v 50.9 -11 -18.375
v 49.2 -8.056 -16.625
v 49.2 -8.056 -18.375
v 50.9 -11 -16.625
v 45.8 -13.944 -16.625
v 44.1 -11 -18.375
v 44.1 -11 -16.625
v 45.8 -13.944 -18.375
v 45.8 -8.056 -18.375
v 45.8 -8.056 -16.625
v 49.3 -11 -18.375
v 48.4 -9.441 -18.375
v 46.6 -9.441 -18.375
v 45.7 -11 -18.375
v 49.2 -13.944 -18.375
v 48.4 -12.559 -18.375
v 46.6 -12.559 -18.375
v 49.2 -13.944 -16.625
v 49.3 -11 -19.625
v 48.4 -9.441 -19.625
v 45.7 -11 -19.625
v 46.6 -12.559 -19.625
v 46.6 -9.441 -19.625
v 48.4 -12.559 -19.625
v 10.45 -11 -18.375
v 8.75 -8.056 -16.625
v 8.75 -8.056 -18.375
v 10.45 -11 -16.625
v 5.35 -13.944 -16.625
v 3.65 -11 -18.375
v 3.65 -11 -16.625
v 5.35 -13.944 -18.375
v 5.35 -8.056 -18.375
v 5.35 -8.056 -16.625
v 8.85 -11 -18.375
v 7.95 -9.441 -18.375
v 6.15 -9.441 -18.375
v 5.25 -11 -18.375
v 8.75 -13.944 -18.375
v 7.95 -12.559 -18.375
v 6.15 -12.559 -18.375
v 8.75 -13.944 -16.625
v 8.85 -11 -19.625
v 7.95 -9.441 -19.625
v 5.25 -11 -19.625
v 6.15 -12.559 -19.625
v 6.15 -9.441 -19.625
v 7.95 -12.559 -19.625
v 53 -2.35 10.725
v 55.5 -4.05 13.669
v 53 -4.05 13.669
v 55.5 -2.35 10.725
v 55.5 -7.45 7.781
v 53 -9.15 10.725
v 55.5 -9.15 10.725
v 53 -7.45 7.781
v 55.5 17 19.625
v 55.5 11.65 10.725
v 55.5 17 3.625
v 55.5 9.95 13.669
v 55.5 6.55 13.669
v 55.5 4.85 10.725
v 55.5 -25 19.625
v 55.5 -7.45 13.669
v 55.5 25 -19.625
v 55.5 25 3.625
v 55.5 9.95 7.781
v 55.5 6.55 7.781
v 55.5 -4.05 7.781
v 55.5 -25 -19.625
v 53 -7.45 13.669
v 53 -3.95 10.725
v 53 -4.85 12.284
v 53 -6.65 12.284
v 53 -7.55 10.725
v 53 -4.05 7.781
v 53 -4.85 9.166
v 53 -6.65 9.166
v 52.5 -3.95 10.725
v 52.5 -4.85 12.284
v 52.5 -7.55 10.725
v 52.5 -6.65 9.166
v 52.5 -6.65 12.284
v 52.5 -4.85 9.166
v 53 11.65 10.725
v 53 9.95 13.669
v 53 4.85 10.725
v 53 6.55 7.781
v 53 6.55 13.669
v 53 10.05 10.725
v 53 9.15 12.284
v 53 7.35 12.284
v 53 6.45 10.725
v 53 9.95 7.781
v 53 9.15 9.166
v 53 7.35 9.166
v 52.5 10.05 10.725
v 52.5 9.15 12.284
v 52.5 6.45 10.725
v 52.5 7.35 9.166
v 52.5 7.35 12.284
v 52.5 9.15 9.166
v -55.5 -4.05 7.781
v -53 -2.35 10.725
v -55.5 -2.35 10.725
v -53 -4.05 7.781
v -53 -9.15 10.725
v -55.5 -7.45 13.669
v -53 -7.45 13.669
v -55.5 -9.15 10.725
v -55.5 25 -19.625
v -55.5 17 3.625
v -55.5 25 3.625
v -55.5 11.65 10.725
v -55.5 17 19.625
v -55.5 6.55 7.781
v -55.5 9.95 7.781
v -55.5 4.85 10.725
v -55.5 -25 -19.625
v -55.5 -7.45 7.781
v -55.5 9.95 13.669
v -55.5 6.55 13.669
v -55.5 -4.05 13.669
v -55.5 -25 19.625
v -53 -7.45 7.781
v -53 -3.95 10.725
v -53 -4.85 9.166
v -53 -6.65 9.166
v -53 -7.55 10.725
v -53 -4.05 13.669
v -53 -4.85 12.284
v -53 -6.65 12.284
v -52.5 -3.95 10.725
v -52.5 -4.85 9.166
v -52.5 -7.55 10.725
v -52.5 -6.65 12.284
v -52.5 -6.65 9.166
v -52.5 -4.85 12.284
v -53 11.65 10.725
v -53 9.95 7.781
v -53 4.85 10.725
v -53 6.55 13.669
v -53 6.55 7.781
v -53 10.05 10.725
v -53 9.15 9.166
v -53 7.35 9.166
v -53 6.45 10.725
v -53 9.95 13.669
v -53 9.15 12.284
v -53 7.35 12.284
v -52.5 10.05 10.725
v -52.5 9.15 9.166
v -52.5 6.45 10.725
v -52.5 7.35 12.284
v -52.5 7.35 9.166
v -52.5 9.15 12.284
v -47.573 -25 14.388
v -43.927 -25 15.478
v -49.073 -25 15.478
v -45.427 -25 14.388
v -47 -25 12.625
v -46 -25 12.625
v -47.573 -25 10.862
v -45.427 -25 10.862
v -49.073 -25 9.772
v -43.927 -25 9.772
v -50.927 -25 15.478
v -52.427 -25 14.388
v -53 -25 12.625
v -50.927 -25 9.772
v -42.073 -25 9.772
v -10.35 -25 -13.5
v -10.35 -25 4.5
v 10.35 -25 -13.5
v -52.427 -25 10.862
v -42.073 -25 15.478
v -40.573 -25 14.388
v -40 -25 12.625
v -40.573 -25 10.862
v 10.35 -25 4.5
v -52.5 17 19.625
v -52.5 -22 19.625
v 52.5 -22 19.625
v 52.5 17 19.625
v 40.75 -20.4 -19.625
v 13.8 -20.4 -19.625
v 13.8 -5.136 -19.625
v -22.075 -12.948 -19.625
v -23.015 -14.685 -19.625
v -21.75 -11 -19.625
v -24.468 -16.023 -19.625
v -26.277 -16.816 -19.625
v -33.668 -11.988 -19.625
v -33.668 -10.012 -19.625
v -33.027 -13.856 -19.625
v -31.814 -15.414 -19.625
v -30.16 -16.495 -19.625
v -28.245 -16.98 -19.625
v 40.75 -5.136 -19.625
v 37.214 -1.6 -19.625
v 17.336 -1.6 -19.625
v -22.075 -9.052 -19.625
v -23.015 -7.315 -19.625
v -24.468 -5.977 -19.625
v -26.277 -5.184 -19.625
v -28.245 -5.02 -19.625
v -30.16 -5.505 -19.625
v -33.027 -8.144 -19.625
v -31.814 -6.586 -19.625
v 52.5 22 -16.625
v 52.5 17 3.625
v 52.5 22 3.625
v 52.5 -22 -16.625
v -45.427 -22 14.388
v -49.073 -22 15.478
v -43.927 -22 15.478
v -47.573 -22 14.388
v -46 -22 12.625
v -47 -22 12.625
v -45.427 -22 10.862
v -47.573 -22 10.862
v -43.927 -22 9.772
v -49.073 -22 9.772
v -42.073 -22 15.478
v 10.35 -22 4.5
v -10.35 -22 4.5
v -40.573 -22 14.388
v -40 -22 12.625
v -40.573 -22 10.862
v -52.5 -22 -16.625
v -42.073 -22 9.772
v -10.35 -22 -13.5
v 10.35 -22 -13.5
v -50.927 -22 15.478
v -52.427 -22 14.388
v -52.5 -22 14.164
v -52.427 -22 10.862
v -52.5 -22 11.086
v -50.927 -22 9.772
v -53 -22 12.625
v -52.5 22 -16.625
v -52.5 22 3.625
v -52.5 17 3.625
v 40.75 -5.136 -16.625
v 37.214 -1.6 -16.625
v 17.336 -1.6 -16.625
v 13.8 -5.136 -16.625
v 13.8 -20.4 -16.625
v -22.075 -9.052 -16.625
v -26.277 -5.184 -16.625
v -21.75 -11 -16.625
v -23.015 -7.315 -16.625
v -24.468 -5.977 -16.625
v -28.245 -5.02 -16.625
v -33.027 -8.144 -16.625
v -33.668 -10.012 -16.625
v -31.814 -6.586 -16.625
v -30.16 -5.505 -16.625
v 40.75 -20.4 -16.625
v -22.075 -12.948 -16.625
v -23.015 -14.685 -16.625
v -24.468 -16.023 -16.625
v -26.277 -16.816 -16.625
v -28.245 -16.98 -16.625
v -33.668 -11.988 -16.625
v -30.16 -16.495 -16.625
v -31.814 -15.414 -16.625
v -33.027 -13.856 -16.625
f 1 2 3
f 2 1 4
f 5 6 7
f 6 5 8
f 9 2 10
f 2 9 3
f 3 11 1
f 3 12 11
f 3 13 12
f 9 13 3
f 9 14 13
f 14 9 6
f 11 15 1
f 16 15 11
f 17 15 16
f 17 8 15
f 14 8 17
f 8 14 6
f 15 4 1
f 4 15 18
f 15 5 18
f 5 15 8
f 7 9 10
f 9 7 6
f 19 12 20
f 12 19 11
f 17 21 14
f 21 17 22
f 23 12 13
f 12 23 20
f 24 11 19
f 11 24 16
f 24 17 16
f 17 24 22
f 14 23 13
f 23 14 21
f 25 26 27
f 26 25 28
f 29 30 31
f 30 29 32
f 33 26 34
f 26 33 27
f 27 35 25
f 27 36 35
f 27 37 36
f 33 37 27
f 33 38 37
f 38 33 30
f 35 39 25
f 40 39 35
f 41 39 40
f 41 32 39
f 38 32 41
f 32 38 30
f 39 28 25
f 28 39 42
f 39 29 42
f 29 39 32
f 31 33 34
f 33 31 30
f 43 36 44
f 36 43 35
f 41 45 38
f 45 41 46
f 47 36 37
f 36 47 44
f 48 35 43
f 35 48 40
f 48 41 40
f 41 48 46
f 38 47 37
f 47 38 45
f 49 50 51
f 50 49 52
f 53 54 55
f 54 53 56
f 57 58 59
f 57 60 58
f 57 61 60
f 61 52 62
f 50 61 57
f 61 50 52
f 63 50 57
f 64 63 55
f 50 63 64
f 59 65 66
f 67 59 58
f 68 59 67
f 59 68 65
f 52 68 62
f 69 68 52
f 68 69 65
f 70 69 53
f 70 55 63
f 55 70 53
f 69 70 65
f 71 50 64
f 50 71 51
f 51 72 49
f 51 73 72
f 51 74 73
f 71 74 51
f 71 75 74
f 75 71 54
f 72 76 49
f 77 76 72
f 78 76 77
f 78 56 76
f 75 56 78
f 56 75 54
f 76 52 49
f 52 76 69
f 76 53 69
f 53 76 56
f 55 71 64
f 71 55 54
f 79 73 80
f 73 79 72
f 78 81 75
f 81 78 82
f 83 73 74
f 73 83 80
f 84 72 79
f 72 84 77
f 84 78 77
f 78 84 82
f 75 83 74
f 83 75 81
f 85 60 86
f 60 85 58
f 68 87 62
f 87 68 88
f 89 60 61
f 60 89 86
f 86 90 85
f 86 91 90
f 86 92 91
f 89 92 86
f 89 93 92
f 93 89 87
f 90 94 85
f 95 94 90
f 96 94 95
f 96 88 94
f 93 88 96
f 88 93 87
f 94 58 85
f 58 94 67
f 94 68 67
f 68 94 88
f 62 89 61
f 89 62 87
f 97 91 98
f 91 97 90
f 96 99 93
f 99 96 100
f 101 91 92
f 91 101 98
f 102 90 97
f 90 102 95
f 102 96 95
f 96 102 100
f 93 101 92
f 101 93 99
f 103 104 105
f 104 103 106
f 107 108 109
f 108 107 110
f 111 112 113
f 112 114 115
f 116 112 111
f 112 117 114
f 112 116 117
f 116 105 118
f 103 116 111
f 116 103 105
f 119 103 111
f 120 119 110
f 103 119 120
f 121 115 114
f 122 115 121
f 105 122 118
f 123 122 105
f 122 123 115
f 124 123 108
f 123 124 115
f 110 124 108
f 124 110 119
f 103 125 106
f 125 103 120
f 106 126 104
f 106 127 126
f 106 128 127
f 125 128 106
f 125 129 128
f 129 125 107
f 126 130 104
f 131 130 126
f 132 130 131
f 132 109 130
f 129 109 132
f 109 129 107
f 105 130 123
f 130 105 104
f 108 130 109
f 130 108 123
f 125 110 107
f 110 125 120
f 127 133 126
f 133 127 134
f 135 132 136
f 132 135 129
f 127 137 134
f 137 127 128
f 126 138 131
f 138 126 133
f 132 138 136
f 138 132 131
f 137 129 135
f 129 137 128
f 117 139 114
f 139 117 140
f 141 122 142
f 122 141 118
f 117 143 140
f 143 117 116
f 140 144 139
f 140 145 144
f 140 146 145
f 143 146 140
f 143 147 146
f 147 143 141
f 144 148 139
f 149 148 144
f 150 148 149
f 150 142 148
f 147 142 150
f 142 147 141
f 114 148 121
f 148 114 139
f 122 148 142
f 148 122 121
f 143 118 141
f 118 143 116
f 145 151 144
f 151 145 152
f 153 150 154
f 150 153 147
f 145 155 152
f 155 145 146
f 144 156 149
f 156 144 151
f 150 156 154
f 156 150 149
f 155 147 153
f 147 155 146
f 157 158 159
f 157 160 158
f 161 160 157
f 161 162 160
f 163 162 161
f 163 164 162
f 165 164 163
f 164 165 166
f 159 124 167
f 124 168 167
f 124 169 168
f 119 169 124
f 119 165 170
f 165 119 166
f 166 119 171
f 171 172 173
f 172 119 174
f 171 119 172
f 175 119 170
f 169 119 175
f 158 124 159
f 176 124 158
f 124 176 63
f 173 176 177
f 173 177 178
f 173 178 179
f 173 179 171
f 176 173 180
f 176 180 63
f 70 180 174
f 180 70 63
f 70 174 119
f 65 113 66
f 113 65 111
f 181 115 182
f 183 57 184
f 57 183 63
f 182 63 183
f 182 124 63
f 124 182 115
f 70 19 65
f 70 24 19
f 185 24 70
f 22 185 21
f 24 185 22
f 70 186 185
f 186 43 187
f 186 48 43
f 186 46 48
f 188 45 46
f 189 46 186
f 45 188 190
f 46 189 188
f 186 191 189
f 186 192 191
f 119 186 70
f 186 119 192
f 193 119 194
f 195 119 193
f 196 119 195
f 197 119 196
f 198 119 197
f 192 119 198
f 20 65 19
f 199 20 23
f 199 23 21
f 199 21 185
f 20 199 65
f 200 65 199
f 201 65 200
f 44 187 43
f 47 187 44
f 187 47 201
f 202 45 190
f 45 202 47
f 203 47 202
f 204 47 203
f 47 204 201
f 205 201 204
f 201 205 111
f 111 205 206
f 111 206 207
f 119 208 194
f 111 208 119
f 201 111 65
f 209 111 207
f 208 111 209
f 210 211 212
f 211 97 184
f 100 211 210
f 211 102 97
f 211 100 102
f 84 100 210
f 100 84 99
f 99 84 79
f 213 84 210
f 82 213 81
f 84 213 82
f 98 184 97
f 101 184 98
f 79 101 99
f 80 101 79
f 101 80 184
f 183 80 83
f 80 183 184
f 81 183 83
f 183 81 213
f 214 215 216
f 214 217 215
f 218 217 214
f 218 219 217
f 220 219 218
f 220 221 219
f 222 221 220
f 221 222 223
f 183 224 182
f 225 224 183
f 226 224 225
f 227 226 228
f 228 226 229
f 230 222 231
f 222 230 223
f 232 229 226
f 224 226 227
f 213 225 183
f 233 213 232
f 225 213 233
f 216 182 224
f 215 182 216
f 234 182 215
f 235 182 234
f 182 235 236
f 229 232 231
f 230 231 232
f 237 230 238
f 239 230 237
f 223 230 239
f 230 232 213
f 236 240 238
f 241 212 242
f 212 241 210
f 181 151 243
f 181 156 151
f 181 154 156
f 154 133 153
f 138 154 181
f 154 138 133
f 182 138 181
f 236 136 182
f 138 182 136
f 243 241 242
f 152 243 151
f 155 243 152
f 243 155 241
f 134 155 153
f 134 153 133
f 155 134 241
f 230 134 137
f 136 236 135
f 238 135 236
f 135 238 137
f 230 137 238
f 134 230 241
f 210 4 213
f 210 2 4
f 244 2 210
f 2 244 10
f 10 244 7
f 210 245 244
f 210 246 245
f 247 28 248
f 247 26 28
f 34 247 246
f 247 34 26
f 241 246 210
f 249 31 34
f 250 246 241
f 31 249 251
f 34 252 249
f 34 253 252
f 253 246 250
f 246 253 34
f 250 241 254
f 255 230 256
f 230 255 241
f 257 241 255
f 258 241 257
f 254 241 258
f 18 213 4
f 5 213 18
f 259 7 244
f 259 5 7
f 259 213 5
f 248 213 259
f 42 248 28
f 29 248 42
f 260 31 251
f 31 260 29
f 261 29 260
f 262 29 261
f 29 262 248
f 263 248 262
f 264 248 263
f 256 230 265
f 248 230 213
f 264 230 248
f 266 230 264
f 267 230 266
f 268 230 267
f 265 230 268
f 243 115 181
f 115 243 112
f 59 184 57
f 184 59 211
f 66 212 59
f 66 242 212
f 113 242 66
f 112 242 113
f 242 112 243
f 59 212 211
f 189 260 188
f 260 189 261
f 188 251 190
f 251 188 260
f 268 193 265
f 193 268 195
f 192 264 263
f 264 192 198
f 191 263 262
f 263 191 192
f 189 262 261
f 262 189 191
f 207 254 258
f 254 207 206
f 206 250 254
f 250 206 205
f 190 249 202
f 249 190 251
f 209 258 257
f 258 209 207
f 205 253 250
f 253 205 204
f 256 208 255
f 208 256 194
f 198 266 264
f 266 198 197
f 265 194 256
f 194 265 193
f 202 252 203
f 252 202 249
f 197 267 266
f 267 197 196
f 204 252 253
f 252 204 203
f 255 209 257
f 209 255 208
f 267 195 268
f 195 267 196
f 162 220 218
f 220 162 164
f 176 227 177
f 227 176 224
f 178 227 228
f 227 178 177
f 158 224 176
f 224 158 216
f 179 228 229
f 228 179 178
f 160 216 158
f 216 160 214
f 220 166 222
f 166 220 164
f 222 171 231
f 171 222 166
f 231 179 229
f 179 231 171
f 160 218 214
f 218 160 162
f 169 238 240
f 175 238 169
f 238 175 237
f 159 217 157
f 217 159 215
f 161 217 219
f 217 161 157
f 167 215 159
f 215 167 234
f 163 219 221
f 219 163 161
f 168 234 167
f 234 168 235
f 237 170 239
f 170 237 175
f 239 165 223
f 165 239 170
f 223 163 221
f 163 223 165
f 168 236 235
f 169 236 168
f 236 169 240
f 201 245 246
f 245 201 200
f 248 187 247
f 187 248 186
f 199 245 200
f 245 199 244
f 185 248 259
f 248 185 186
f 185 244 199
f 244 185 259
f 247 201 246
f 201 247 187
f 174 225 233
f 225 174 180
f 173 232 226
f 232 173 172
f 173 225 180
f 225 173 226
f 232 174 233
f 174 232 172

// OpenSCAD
show_assembly = false; // Set to false to only show the part

power_supply_depth = 215;
power_supply_width = 114;
power_supply_height = 50;
power_supply_wall_thickness = 1.5;
power_supply_cutout_depth = 16; // cutout for terminals
power_supply_cutout_height = 42; // from top
power_supply_slot_depth_offset = 5.4; // from front
power_supply_slot_bottom_offset = 11.25;
power_supply_slot_dia = 2.88; // to be verified
power_supply_slot_height = 25;
power_supply_width_pot_offset = power_supply_width/2 - 14;
power_supply_width_led_offset = power_supply_width/2 - 7;
power_supply_depth_pot_offset = 7; // From cutout edge, also used for the led
power_supply_screw_bank_width = 87.5;
power_supply_screw_bank_height = 20;
power_supply_screw_bank_right_offset = 5;

connector_front_height = 22;
connector_front_width = 30.45;
connector_front_depth = 4.75;
connector_contact_depth = 10;
connector_depth = 28; // including everything
connector_body_depth = connector_depth - connector_front_depth - connector_contact_depth;
connector_body_height = 18.8;
connector_body_width = 26.95;
connector_has_wings = true;
connector_wing_width = 10;
connector_wing_depth = 3.85;
connector_screw_center = 5; // inside wing
connector_contact_width_sep = 15;
connector_contact_height_sep = 7.5;
connector_contact_width = 2.2;
connector_contact_height = 3.9;

switch_depth = 28.0; // including contacts
switch_front_height = 21.25;
switch_front_width = 27.0;
switch_front_depth = 3; // to be verified
switch_contact_depth = 7;
switch_contact_height = 5;
switch_contact_width = 2;
switch_contact_distance = 7;
switch_body_height = 12.1;
switch_body_width = 20.7;
switch_body_depth = switch_depth - switch_front_depth - switch_contact_depth;

m3_nut_height=2.5;
m3_nut_radius=3.4;
m3_nut_dia=m3_nut_radius*2;
m3_bolt_radius=1.8;
m3_bolt_dia=m3_bolt_radius*2;

module nut_trap(wall_thickness) {
	union() {
		rotate([0, 90, 0])
			cylinder(r=m3_nut_radius, h=m3_nut_height, $fn=6, center=true);
		translate([wall_thickness - m3_nut_height, 0, 0])
			rotate([0, 90, 0])
				cylinder(r=m3_bolt_radius, h=wall_thickness, center=true);
	}
}

module power_supply_slot() {
	hull() {
		translate([0,0,power_supply_slot_height/2 - power_supply_slot_dia/2])
			rotate([0,90,0])
				cylinder(h=power_supply_wall_thickness, d=power_supply_slot_dia, center=true, $fn=16);
		translate([0,0,-power_supply_slot_height/2 + power_supply_slot_dia/2])
			rotate([0,90,0])
				cylinder(h=power_supply_wall_thickness, d=power_supply_slot_dia, center=true, $fn=16);
	}
}

module power_supply() {
	union() {
		difference() {
			cube([	power_supply_width,
					power_supply_depth,
					power_supply_height], true);
			translate([0, 
						-power_supply_depth/2 + power_supply_cutout_depth/2, 
						power_supply_height/2 - power_supply_cutout_height/2])
				cube([	power_supply_width - power_supply_wall_thickness*2,
						power_supply_cutout_depth, 
						power_supply_cutout_height],
						true);
			translate([	power_supply_width/2 - power_supply_wall_thickness/2,
							-power_supply_depth/2 + power_supply_wall_thickness + power_supply_slot_depth_offset,
							-power_supply_height/2 + power_supply_slot_height/2 + power_supply_slot_bottom_offset])
				power_supply_slot();
			translate([	-power_supply_width/2 + power_supply_wall_thickness/2,
							-power_supply_depth/2 + power_supply_wall_thickness + power_supply_slot_depth_offset,
							-power_supply_height/2 + power_supply_slot_height/2 + power_supply_slot_bottom_offset])
				power_supply_slot();
		}
		translate([	power_supply_width/2 - power_supply_wall_thickness -
							power_supply_screw_bank_right_offset - power_supply_screw_bank_width/2,
						-power_supply_depth/2 + power_supply_cutout_depth/2,
						-power_supply_height/2 + power_supply_screw_bank_height/2 +
							power_supply_height - power_supply_cutout_height])
			cube([	power_supply_screw_bank_width,
					power_supply_cutout_depth,
					power_supply_screw_bank_height],
					true);
	}
}

module power_connector_shape(height, width, depth, cornerWidth) {
	rotationOffset = sqrt(cornerWidth*cornerWidth+cornerWidth*cornerWidth)/2 - cornerWidth/2;
	widthOffset = width/2 - cornerWidth/2;
	heightOffset = height/2 - cornerWidth/2;
	hull() {
		translate([-widthOffset, 0, heightOffset]) cube([cornerWidth,depth,cornerWidth], true);
		translate([widthOffset, 0, heightOffset]) cube([cornerWidth,depth,cornerWidth], true);
		translate([-widthOffset + rotationOffset, 0, -heightOffset + rotationOffset]) rotate([0,45,0])
			cube([cornerWidth,depth,cornerWidth], true);
		translate([widthOffset - rotationOffset, 0, -heightOffset + rotationOffset]) rotate([0,45,0])
			cube([cornerWidth,depth,cornerWidth], true);
	}
}

module power_connector_wing() {
	difference() {
		hull() {
			translate([-connector_wing_width/2,0,-connector_wing_depth/2])
				linear_extrude(height=connector_wing_depth) 
					polygon(points=[	[0,-connector_front_height/2],
											[0, connector_front_height/2],
											[connector_wing_width, 0]]);
			translate([connector_wing_width/2 - m3_bolt_dia*1.5/2,0,0])
				cylinder(h = connector_wing_depth, d = m3_bolt_dia*1.5, center = true);
		}
	translate([-connector_wing_width/2 + connector_screw_center, 0, 0])
		cylinder(h = connector_wing_depth, d = m3_bolt_dia, center = true);
	}
}

module power_connector_contact() {
	cube([connector_contact_width,connector_depth, connector_contact_height], true);
}

module power_connector() {
	union() {
		difference() {
			union() {
				cube([	connector_front_width, 
						connector_front_depth, 
						connector_front_height], true);
				translate([0, connector_front_depth / 2 + connector_body_depth / 2])
					power_connector_shape(	height = connector_body_height,
													width = connector_body_width,
													depth = connector_body_depth,
													cornerWidth = 5);
				if (connector_has_wings) {
					translate([	connector_wing_width/2 + connector_front_width/2,
									connector_front_depth/2 - connector_wing_depth/2,
									0]) 
						rotate([90,0,0]) power_connector_wing();
					translate([	-connector_wing_width/2 - connector_front_width/2,
									connector_front_depth/2 - connector_wing_depth/2,
									0])
						rotate([90,0,180]) power_connector_wing();
				}
			}
			translate([0,connector_front_depth/2,0])
				power_connector_shape(	height = connector_body_height-4,
												width = connector_body_width-4,
												depth = connector_body_depth,
												cornerWidth = 5);
		}
		translate([	-connector_contact_width_sep/2,
						connector_depth/2 - connector_front_depth/2,
						connector_contact_height_sep/2]) 
			power_connector_contact();
		translate([	connector_contact_width_sep/2,
						connector_depth/2 - connector_front_depth/2,
						connector_contact_height_sep/2]) 
			power_connector_contact();
		translate([	0,
						connector_depth/2 - connector_front_depth/2,
						-connector_contact_height_sep/2]) 
			power_connector_contact();
	}
}

module power_switch() {
	
	union() {
		cube([switch_front_width, switch_front_depth, switch_front_height], true);
		intersection() {
			translate([0,-6/2 - switch_front_depth/2,0])
				cube([switch_front_width, 6, switch_front_height], true);
			translate([-switch_front_width/4,1,0]) rotate([0,0,35])
				cube([switch_body_width/2 - 3, 10, switch_body_height - 3], true);
		}
		translate([0, switch_body_depth/2 + switch_front_depth/2, 0])
			cube([switch_body_width, switch_body_depth, switch_body_height], true);
		translate([0, switch_contact_depth / 2 + switch_body_depth + switch_front_depth/2, 0])
			cube([switch_contact_width, switch_contact_depth, switch_contact_height], true);
		translate([	switch_contact_distance,
						switch_contact_depth / 2 + switch_body_depth + switch_front_depth/2,
						0])
			cube([switch_contact_width, switch_contact_depth, switch_contact_height], true);
	}
}

cover_wall_thickness = 3;
cover_width = power_supply_width - power_supply_wall_thickness*2;
cover_depth = connector_body_depth + connector_contact_depth + power_supply_cutout_depth;
cover_height = power_supply_height;
cover_12V_hole_diameter = 12;
cover_pot_hole_diameter = 6; // also for led
cover_side_extension_depth = 0;

module power_supply_cover() {
	difference() {
		// Main body
		cube([cover_width, cover_depth+cover_side_extension_depth, cover_height], true);
		// Only keep side walls after cutout
		translate([0,cover_depth/2 ,0])
			cube([power_supply_width, cover_side_extension_depth, cover_height], true);
		// Remove inner space
		translate([0,cover_wall_thickness/2,0])
			cube([	cover_width-cover_wall_thickness*2,
					cover_depth+cover_side_extension_depth-cover_wall_thickness,
					cover_height-cover_wall_thickness*2],
					true);
		// Remove bottom section so the cover can fit over the screw terminal
		translate([	0,
						cover_depth/2-power_supply_cutout_depth/2,
						-power_supply_height/2+(power_supply_height - power_supply_cutout_height)/2])
			cube([	power_supply_width - power_supply_wall_thickness*2,
					power_supply_cutout_depth,
					power_supply_height - power_supply_cutout_height],
					true);
		// Hole for 12V cable
		translate([	-cover_width/4,
						-cover_depth/2-cover_side_extension_depth/2+cover_wall_thickness/2,
						cover_height/2 - connector_front_height/2 - cover_wall_thickness])
			rotate([90,0,0])
				cylinder(h=cover_wall_thickness, d=cover_12V_hole_diameter, center=true);
		// Hole for pot
		translate([	-power_supply_width_pot_offset,
						cover_depth/2 - cover_side_extension_depth/2 - power_supply_depth_pot_offset,
						cover_height/2-cover_wall_thickness/2])
			cylinder(h=cover_wall_thickness, d=cover_pot_hole_diameter, center=true);
		// Hole for led
		translate([	-power_supply_width_led_offset,
						cover_depth/2 - cover_side_extension_depth/2 - power_supply_depth_pot_offset,
						cover_height/2-cover_wall_thickness/2])
			cylinder(h=cover_wall_thickness, d=cover_pot_hole_diameter, center=true);
		// Hole for power connector
		translate([	cover_width/2 - connector_wing_width - connector_front_width/2 - cover_wall_thickness,
						-cover_depth/2 - cover_side_extension_depth/2 + cover_wall_thickness/2,
						cover_height/2 - connector_front_height/2 - cover_wall_thickness])
				power_connector_shape(	height = connector_body_height,
												width = connector_body_width,
												depth = cover_wall_thickness,
												cornerWidth = 5);
		// Nut trap for screw power connector 1
		translate([	cover_width/2 - connector_wing_width - cover_wall_thickness + connector_screw_center,
						-cover_depth/2 - cover_side_extension_depth/2 + cover_wall_thickness/2 + 1,
						cover_height/2 - connector_front_height/2 - cover_wall_thickness])
			rotate([90,0,-90])
				nut_trap(cover_wall_thickness + 1);
		// Nut trap for screw power connector 2
		translate([	cover_width/2 - connector_wing_width - cover_wall_thickness -
							connector_screw_center - connector_front_width,
						-cover_depth/2 - cover_side_extension_depth/2 + cover_wall_thickness/2 + 1,
						cover_height/2 - connector_front_height/2 - cover_wall_thickness])
			rotate([90,0,-90])
				nut_trap(cover_wall_thickness + 1);
		// Hole for switch
		translate([	0,
				-cover_depth/2 - cover_side_extension_depth/2 + switch_front_height/2 + 1.5*cover_wall_thickness,
				cover_height/2 - cover_wall_thickness/2]) 
			cube([switch_body_width, switch_body_depth, cover_wall_thickness], true);
		// Nut trap 1
		translate([	cover_width/2 - m3_nut_height/2,
						cover_depth/2 - power_supply_cutout_depth+power_supply_slot_depth_offset+m3_nut_radius/2,
						-power_supply_height/2 + power_supply_slot_height/2 + 
							power_supply_slot_bottom_offset  + power_supply_cutout_height/6])
			rotate([0,0,180])
				nut_trap(cover_wall_thickness);
		// Nut trap 2
		translate([	cover_width/2 - m3_nut_height/2,
						cover_depth/2 - power_supply_cutout_depth+power_supply_slot_depth_offset+m3_nut_radius/2,
						-power_supply_height/2 + power_supply_slot_height/2 + 
							power_supply_slot_bottom_offset - power_supply_cutout_height/6])
			rotate([0,0,180])
				nut_trap(cover_wall_thickness);
		// Nut trap 3
		translate([	-cover_width/2 + m3_nut_height/2,
						cover_depth/2 - power_supply_cutout_depth+power_supply_slot_depth_offset+m3_nut_radius/2,
						-power_supply_height/2 + power_supply_slot_height/2 + 
							power_supply_slot_bottom_offset  + power_supply_cutout_height/6])
				nut_trap(cover_wall_thickness);
		// Nut trap 4
		translate([	-cover_width/2 + m3_nut_height/2,
						cover_depth/2 - power_supply_cutout_depth+power_supply_slot_depth_offset+m3_nut_radius/2,
						-power_supply_height/2 + power_supply_slot_height/2 + 
							power_supply_slot_bottom_offset - power_supply_cutout_height/6])
				nut_trap(cover_wall_thickness);
	}
}

if (show_assembly) {
	translate([	0, 
					power_supply_depth/2 + cover_depth/2 - cover_side_extension_depth/2 -
						power_supply_cutout_depth,
					0])
		power_supply();
	*translate([	cover_width/2 - connector_wing_width - connector_front_width/2 - cover_wall_thickness,
					-cover_depth/2 - cover_side_extension_depth/2 - connector_front_depth/2,
					cover_height/2 - connector_front_height/2 - cover_wall_thickness])
		power_connector();
	*translate([	0,
					-cover_depth/2 - cover_side_extension_depth/2 +
						 switch_front_height/2 + 1.5*cover_wall_thickness,
					cover_height/2 + switch_front_depth/2]) 
		rotate([-90,0,0]) power_switch();
	%power_supply_cover();
} else {
	rotate([90,0,0]) power_supply_cover();
}
